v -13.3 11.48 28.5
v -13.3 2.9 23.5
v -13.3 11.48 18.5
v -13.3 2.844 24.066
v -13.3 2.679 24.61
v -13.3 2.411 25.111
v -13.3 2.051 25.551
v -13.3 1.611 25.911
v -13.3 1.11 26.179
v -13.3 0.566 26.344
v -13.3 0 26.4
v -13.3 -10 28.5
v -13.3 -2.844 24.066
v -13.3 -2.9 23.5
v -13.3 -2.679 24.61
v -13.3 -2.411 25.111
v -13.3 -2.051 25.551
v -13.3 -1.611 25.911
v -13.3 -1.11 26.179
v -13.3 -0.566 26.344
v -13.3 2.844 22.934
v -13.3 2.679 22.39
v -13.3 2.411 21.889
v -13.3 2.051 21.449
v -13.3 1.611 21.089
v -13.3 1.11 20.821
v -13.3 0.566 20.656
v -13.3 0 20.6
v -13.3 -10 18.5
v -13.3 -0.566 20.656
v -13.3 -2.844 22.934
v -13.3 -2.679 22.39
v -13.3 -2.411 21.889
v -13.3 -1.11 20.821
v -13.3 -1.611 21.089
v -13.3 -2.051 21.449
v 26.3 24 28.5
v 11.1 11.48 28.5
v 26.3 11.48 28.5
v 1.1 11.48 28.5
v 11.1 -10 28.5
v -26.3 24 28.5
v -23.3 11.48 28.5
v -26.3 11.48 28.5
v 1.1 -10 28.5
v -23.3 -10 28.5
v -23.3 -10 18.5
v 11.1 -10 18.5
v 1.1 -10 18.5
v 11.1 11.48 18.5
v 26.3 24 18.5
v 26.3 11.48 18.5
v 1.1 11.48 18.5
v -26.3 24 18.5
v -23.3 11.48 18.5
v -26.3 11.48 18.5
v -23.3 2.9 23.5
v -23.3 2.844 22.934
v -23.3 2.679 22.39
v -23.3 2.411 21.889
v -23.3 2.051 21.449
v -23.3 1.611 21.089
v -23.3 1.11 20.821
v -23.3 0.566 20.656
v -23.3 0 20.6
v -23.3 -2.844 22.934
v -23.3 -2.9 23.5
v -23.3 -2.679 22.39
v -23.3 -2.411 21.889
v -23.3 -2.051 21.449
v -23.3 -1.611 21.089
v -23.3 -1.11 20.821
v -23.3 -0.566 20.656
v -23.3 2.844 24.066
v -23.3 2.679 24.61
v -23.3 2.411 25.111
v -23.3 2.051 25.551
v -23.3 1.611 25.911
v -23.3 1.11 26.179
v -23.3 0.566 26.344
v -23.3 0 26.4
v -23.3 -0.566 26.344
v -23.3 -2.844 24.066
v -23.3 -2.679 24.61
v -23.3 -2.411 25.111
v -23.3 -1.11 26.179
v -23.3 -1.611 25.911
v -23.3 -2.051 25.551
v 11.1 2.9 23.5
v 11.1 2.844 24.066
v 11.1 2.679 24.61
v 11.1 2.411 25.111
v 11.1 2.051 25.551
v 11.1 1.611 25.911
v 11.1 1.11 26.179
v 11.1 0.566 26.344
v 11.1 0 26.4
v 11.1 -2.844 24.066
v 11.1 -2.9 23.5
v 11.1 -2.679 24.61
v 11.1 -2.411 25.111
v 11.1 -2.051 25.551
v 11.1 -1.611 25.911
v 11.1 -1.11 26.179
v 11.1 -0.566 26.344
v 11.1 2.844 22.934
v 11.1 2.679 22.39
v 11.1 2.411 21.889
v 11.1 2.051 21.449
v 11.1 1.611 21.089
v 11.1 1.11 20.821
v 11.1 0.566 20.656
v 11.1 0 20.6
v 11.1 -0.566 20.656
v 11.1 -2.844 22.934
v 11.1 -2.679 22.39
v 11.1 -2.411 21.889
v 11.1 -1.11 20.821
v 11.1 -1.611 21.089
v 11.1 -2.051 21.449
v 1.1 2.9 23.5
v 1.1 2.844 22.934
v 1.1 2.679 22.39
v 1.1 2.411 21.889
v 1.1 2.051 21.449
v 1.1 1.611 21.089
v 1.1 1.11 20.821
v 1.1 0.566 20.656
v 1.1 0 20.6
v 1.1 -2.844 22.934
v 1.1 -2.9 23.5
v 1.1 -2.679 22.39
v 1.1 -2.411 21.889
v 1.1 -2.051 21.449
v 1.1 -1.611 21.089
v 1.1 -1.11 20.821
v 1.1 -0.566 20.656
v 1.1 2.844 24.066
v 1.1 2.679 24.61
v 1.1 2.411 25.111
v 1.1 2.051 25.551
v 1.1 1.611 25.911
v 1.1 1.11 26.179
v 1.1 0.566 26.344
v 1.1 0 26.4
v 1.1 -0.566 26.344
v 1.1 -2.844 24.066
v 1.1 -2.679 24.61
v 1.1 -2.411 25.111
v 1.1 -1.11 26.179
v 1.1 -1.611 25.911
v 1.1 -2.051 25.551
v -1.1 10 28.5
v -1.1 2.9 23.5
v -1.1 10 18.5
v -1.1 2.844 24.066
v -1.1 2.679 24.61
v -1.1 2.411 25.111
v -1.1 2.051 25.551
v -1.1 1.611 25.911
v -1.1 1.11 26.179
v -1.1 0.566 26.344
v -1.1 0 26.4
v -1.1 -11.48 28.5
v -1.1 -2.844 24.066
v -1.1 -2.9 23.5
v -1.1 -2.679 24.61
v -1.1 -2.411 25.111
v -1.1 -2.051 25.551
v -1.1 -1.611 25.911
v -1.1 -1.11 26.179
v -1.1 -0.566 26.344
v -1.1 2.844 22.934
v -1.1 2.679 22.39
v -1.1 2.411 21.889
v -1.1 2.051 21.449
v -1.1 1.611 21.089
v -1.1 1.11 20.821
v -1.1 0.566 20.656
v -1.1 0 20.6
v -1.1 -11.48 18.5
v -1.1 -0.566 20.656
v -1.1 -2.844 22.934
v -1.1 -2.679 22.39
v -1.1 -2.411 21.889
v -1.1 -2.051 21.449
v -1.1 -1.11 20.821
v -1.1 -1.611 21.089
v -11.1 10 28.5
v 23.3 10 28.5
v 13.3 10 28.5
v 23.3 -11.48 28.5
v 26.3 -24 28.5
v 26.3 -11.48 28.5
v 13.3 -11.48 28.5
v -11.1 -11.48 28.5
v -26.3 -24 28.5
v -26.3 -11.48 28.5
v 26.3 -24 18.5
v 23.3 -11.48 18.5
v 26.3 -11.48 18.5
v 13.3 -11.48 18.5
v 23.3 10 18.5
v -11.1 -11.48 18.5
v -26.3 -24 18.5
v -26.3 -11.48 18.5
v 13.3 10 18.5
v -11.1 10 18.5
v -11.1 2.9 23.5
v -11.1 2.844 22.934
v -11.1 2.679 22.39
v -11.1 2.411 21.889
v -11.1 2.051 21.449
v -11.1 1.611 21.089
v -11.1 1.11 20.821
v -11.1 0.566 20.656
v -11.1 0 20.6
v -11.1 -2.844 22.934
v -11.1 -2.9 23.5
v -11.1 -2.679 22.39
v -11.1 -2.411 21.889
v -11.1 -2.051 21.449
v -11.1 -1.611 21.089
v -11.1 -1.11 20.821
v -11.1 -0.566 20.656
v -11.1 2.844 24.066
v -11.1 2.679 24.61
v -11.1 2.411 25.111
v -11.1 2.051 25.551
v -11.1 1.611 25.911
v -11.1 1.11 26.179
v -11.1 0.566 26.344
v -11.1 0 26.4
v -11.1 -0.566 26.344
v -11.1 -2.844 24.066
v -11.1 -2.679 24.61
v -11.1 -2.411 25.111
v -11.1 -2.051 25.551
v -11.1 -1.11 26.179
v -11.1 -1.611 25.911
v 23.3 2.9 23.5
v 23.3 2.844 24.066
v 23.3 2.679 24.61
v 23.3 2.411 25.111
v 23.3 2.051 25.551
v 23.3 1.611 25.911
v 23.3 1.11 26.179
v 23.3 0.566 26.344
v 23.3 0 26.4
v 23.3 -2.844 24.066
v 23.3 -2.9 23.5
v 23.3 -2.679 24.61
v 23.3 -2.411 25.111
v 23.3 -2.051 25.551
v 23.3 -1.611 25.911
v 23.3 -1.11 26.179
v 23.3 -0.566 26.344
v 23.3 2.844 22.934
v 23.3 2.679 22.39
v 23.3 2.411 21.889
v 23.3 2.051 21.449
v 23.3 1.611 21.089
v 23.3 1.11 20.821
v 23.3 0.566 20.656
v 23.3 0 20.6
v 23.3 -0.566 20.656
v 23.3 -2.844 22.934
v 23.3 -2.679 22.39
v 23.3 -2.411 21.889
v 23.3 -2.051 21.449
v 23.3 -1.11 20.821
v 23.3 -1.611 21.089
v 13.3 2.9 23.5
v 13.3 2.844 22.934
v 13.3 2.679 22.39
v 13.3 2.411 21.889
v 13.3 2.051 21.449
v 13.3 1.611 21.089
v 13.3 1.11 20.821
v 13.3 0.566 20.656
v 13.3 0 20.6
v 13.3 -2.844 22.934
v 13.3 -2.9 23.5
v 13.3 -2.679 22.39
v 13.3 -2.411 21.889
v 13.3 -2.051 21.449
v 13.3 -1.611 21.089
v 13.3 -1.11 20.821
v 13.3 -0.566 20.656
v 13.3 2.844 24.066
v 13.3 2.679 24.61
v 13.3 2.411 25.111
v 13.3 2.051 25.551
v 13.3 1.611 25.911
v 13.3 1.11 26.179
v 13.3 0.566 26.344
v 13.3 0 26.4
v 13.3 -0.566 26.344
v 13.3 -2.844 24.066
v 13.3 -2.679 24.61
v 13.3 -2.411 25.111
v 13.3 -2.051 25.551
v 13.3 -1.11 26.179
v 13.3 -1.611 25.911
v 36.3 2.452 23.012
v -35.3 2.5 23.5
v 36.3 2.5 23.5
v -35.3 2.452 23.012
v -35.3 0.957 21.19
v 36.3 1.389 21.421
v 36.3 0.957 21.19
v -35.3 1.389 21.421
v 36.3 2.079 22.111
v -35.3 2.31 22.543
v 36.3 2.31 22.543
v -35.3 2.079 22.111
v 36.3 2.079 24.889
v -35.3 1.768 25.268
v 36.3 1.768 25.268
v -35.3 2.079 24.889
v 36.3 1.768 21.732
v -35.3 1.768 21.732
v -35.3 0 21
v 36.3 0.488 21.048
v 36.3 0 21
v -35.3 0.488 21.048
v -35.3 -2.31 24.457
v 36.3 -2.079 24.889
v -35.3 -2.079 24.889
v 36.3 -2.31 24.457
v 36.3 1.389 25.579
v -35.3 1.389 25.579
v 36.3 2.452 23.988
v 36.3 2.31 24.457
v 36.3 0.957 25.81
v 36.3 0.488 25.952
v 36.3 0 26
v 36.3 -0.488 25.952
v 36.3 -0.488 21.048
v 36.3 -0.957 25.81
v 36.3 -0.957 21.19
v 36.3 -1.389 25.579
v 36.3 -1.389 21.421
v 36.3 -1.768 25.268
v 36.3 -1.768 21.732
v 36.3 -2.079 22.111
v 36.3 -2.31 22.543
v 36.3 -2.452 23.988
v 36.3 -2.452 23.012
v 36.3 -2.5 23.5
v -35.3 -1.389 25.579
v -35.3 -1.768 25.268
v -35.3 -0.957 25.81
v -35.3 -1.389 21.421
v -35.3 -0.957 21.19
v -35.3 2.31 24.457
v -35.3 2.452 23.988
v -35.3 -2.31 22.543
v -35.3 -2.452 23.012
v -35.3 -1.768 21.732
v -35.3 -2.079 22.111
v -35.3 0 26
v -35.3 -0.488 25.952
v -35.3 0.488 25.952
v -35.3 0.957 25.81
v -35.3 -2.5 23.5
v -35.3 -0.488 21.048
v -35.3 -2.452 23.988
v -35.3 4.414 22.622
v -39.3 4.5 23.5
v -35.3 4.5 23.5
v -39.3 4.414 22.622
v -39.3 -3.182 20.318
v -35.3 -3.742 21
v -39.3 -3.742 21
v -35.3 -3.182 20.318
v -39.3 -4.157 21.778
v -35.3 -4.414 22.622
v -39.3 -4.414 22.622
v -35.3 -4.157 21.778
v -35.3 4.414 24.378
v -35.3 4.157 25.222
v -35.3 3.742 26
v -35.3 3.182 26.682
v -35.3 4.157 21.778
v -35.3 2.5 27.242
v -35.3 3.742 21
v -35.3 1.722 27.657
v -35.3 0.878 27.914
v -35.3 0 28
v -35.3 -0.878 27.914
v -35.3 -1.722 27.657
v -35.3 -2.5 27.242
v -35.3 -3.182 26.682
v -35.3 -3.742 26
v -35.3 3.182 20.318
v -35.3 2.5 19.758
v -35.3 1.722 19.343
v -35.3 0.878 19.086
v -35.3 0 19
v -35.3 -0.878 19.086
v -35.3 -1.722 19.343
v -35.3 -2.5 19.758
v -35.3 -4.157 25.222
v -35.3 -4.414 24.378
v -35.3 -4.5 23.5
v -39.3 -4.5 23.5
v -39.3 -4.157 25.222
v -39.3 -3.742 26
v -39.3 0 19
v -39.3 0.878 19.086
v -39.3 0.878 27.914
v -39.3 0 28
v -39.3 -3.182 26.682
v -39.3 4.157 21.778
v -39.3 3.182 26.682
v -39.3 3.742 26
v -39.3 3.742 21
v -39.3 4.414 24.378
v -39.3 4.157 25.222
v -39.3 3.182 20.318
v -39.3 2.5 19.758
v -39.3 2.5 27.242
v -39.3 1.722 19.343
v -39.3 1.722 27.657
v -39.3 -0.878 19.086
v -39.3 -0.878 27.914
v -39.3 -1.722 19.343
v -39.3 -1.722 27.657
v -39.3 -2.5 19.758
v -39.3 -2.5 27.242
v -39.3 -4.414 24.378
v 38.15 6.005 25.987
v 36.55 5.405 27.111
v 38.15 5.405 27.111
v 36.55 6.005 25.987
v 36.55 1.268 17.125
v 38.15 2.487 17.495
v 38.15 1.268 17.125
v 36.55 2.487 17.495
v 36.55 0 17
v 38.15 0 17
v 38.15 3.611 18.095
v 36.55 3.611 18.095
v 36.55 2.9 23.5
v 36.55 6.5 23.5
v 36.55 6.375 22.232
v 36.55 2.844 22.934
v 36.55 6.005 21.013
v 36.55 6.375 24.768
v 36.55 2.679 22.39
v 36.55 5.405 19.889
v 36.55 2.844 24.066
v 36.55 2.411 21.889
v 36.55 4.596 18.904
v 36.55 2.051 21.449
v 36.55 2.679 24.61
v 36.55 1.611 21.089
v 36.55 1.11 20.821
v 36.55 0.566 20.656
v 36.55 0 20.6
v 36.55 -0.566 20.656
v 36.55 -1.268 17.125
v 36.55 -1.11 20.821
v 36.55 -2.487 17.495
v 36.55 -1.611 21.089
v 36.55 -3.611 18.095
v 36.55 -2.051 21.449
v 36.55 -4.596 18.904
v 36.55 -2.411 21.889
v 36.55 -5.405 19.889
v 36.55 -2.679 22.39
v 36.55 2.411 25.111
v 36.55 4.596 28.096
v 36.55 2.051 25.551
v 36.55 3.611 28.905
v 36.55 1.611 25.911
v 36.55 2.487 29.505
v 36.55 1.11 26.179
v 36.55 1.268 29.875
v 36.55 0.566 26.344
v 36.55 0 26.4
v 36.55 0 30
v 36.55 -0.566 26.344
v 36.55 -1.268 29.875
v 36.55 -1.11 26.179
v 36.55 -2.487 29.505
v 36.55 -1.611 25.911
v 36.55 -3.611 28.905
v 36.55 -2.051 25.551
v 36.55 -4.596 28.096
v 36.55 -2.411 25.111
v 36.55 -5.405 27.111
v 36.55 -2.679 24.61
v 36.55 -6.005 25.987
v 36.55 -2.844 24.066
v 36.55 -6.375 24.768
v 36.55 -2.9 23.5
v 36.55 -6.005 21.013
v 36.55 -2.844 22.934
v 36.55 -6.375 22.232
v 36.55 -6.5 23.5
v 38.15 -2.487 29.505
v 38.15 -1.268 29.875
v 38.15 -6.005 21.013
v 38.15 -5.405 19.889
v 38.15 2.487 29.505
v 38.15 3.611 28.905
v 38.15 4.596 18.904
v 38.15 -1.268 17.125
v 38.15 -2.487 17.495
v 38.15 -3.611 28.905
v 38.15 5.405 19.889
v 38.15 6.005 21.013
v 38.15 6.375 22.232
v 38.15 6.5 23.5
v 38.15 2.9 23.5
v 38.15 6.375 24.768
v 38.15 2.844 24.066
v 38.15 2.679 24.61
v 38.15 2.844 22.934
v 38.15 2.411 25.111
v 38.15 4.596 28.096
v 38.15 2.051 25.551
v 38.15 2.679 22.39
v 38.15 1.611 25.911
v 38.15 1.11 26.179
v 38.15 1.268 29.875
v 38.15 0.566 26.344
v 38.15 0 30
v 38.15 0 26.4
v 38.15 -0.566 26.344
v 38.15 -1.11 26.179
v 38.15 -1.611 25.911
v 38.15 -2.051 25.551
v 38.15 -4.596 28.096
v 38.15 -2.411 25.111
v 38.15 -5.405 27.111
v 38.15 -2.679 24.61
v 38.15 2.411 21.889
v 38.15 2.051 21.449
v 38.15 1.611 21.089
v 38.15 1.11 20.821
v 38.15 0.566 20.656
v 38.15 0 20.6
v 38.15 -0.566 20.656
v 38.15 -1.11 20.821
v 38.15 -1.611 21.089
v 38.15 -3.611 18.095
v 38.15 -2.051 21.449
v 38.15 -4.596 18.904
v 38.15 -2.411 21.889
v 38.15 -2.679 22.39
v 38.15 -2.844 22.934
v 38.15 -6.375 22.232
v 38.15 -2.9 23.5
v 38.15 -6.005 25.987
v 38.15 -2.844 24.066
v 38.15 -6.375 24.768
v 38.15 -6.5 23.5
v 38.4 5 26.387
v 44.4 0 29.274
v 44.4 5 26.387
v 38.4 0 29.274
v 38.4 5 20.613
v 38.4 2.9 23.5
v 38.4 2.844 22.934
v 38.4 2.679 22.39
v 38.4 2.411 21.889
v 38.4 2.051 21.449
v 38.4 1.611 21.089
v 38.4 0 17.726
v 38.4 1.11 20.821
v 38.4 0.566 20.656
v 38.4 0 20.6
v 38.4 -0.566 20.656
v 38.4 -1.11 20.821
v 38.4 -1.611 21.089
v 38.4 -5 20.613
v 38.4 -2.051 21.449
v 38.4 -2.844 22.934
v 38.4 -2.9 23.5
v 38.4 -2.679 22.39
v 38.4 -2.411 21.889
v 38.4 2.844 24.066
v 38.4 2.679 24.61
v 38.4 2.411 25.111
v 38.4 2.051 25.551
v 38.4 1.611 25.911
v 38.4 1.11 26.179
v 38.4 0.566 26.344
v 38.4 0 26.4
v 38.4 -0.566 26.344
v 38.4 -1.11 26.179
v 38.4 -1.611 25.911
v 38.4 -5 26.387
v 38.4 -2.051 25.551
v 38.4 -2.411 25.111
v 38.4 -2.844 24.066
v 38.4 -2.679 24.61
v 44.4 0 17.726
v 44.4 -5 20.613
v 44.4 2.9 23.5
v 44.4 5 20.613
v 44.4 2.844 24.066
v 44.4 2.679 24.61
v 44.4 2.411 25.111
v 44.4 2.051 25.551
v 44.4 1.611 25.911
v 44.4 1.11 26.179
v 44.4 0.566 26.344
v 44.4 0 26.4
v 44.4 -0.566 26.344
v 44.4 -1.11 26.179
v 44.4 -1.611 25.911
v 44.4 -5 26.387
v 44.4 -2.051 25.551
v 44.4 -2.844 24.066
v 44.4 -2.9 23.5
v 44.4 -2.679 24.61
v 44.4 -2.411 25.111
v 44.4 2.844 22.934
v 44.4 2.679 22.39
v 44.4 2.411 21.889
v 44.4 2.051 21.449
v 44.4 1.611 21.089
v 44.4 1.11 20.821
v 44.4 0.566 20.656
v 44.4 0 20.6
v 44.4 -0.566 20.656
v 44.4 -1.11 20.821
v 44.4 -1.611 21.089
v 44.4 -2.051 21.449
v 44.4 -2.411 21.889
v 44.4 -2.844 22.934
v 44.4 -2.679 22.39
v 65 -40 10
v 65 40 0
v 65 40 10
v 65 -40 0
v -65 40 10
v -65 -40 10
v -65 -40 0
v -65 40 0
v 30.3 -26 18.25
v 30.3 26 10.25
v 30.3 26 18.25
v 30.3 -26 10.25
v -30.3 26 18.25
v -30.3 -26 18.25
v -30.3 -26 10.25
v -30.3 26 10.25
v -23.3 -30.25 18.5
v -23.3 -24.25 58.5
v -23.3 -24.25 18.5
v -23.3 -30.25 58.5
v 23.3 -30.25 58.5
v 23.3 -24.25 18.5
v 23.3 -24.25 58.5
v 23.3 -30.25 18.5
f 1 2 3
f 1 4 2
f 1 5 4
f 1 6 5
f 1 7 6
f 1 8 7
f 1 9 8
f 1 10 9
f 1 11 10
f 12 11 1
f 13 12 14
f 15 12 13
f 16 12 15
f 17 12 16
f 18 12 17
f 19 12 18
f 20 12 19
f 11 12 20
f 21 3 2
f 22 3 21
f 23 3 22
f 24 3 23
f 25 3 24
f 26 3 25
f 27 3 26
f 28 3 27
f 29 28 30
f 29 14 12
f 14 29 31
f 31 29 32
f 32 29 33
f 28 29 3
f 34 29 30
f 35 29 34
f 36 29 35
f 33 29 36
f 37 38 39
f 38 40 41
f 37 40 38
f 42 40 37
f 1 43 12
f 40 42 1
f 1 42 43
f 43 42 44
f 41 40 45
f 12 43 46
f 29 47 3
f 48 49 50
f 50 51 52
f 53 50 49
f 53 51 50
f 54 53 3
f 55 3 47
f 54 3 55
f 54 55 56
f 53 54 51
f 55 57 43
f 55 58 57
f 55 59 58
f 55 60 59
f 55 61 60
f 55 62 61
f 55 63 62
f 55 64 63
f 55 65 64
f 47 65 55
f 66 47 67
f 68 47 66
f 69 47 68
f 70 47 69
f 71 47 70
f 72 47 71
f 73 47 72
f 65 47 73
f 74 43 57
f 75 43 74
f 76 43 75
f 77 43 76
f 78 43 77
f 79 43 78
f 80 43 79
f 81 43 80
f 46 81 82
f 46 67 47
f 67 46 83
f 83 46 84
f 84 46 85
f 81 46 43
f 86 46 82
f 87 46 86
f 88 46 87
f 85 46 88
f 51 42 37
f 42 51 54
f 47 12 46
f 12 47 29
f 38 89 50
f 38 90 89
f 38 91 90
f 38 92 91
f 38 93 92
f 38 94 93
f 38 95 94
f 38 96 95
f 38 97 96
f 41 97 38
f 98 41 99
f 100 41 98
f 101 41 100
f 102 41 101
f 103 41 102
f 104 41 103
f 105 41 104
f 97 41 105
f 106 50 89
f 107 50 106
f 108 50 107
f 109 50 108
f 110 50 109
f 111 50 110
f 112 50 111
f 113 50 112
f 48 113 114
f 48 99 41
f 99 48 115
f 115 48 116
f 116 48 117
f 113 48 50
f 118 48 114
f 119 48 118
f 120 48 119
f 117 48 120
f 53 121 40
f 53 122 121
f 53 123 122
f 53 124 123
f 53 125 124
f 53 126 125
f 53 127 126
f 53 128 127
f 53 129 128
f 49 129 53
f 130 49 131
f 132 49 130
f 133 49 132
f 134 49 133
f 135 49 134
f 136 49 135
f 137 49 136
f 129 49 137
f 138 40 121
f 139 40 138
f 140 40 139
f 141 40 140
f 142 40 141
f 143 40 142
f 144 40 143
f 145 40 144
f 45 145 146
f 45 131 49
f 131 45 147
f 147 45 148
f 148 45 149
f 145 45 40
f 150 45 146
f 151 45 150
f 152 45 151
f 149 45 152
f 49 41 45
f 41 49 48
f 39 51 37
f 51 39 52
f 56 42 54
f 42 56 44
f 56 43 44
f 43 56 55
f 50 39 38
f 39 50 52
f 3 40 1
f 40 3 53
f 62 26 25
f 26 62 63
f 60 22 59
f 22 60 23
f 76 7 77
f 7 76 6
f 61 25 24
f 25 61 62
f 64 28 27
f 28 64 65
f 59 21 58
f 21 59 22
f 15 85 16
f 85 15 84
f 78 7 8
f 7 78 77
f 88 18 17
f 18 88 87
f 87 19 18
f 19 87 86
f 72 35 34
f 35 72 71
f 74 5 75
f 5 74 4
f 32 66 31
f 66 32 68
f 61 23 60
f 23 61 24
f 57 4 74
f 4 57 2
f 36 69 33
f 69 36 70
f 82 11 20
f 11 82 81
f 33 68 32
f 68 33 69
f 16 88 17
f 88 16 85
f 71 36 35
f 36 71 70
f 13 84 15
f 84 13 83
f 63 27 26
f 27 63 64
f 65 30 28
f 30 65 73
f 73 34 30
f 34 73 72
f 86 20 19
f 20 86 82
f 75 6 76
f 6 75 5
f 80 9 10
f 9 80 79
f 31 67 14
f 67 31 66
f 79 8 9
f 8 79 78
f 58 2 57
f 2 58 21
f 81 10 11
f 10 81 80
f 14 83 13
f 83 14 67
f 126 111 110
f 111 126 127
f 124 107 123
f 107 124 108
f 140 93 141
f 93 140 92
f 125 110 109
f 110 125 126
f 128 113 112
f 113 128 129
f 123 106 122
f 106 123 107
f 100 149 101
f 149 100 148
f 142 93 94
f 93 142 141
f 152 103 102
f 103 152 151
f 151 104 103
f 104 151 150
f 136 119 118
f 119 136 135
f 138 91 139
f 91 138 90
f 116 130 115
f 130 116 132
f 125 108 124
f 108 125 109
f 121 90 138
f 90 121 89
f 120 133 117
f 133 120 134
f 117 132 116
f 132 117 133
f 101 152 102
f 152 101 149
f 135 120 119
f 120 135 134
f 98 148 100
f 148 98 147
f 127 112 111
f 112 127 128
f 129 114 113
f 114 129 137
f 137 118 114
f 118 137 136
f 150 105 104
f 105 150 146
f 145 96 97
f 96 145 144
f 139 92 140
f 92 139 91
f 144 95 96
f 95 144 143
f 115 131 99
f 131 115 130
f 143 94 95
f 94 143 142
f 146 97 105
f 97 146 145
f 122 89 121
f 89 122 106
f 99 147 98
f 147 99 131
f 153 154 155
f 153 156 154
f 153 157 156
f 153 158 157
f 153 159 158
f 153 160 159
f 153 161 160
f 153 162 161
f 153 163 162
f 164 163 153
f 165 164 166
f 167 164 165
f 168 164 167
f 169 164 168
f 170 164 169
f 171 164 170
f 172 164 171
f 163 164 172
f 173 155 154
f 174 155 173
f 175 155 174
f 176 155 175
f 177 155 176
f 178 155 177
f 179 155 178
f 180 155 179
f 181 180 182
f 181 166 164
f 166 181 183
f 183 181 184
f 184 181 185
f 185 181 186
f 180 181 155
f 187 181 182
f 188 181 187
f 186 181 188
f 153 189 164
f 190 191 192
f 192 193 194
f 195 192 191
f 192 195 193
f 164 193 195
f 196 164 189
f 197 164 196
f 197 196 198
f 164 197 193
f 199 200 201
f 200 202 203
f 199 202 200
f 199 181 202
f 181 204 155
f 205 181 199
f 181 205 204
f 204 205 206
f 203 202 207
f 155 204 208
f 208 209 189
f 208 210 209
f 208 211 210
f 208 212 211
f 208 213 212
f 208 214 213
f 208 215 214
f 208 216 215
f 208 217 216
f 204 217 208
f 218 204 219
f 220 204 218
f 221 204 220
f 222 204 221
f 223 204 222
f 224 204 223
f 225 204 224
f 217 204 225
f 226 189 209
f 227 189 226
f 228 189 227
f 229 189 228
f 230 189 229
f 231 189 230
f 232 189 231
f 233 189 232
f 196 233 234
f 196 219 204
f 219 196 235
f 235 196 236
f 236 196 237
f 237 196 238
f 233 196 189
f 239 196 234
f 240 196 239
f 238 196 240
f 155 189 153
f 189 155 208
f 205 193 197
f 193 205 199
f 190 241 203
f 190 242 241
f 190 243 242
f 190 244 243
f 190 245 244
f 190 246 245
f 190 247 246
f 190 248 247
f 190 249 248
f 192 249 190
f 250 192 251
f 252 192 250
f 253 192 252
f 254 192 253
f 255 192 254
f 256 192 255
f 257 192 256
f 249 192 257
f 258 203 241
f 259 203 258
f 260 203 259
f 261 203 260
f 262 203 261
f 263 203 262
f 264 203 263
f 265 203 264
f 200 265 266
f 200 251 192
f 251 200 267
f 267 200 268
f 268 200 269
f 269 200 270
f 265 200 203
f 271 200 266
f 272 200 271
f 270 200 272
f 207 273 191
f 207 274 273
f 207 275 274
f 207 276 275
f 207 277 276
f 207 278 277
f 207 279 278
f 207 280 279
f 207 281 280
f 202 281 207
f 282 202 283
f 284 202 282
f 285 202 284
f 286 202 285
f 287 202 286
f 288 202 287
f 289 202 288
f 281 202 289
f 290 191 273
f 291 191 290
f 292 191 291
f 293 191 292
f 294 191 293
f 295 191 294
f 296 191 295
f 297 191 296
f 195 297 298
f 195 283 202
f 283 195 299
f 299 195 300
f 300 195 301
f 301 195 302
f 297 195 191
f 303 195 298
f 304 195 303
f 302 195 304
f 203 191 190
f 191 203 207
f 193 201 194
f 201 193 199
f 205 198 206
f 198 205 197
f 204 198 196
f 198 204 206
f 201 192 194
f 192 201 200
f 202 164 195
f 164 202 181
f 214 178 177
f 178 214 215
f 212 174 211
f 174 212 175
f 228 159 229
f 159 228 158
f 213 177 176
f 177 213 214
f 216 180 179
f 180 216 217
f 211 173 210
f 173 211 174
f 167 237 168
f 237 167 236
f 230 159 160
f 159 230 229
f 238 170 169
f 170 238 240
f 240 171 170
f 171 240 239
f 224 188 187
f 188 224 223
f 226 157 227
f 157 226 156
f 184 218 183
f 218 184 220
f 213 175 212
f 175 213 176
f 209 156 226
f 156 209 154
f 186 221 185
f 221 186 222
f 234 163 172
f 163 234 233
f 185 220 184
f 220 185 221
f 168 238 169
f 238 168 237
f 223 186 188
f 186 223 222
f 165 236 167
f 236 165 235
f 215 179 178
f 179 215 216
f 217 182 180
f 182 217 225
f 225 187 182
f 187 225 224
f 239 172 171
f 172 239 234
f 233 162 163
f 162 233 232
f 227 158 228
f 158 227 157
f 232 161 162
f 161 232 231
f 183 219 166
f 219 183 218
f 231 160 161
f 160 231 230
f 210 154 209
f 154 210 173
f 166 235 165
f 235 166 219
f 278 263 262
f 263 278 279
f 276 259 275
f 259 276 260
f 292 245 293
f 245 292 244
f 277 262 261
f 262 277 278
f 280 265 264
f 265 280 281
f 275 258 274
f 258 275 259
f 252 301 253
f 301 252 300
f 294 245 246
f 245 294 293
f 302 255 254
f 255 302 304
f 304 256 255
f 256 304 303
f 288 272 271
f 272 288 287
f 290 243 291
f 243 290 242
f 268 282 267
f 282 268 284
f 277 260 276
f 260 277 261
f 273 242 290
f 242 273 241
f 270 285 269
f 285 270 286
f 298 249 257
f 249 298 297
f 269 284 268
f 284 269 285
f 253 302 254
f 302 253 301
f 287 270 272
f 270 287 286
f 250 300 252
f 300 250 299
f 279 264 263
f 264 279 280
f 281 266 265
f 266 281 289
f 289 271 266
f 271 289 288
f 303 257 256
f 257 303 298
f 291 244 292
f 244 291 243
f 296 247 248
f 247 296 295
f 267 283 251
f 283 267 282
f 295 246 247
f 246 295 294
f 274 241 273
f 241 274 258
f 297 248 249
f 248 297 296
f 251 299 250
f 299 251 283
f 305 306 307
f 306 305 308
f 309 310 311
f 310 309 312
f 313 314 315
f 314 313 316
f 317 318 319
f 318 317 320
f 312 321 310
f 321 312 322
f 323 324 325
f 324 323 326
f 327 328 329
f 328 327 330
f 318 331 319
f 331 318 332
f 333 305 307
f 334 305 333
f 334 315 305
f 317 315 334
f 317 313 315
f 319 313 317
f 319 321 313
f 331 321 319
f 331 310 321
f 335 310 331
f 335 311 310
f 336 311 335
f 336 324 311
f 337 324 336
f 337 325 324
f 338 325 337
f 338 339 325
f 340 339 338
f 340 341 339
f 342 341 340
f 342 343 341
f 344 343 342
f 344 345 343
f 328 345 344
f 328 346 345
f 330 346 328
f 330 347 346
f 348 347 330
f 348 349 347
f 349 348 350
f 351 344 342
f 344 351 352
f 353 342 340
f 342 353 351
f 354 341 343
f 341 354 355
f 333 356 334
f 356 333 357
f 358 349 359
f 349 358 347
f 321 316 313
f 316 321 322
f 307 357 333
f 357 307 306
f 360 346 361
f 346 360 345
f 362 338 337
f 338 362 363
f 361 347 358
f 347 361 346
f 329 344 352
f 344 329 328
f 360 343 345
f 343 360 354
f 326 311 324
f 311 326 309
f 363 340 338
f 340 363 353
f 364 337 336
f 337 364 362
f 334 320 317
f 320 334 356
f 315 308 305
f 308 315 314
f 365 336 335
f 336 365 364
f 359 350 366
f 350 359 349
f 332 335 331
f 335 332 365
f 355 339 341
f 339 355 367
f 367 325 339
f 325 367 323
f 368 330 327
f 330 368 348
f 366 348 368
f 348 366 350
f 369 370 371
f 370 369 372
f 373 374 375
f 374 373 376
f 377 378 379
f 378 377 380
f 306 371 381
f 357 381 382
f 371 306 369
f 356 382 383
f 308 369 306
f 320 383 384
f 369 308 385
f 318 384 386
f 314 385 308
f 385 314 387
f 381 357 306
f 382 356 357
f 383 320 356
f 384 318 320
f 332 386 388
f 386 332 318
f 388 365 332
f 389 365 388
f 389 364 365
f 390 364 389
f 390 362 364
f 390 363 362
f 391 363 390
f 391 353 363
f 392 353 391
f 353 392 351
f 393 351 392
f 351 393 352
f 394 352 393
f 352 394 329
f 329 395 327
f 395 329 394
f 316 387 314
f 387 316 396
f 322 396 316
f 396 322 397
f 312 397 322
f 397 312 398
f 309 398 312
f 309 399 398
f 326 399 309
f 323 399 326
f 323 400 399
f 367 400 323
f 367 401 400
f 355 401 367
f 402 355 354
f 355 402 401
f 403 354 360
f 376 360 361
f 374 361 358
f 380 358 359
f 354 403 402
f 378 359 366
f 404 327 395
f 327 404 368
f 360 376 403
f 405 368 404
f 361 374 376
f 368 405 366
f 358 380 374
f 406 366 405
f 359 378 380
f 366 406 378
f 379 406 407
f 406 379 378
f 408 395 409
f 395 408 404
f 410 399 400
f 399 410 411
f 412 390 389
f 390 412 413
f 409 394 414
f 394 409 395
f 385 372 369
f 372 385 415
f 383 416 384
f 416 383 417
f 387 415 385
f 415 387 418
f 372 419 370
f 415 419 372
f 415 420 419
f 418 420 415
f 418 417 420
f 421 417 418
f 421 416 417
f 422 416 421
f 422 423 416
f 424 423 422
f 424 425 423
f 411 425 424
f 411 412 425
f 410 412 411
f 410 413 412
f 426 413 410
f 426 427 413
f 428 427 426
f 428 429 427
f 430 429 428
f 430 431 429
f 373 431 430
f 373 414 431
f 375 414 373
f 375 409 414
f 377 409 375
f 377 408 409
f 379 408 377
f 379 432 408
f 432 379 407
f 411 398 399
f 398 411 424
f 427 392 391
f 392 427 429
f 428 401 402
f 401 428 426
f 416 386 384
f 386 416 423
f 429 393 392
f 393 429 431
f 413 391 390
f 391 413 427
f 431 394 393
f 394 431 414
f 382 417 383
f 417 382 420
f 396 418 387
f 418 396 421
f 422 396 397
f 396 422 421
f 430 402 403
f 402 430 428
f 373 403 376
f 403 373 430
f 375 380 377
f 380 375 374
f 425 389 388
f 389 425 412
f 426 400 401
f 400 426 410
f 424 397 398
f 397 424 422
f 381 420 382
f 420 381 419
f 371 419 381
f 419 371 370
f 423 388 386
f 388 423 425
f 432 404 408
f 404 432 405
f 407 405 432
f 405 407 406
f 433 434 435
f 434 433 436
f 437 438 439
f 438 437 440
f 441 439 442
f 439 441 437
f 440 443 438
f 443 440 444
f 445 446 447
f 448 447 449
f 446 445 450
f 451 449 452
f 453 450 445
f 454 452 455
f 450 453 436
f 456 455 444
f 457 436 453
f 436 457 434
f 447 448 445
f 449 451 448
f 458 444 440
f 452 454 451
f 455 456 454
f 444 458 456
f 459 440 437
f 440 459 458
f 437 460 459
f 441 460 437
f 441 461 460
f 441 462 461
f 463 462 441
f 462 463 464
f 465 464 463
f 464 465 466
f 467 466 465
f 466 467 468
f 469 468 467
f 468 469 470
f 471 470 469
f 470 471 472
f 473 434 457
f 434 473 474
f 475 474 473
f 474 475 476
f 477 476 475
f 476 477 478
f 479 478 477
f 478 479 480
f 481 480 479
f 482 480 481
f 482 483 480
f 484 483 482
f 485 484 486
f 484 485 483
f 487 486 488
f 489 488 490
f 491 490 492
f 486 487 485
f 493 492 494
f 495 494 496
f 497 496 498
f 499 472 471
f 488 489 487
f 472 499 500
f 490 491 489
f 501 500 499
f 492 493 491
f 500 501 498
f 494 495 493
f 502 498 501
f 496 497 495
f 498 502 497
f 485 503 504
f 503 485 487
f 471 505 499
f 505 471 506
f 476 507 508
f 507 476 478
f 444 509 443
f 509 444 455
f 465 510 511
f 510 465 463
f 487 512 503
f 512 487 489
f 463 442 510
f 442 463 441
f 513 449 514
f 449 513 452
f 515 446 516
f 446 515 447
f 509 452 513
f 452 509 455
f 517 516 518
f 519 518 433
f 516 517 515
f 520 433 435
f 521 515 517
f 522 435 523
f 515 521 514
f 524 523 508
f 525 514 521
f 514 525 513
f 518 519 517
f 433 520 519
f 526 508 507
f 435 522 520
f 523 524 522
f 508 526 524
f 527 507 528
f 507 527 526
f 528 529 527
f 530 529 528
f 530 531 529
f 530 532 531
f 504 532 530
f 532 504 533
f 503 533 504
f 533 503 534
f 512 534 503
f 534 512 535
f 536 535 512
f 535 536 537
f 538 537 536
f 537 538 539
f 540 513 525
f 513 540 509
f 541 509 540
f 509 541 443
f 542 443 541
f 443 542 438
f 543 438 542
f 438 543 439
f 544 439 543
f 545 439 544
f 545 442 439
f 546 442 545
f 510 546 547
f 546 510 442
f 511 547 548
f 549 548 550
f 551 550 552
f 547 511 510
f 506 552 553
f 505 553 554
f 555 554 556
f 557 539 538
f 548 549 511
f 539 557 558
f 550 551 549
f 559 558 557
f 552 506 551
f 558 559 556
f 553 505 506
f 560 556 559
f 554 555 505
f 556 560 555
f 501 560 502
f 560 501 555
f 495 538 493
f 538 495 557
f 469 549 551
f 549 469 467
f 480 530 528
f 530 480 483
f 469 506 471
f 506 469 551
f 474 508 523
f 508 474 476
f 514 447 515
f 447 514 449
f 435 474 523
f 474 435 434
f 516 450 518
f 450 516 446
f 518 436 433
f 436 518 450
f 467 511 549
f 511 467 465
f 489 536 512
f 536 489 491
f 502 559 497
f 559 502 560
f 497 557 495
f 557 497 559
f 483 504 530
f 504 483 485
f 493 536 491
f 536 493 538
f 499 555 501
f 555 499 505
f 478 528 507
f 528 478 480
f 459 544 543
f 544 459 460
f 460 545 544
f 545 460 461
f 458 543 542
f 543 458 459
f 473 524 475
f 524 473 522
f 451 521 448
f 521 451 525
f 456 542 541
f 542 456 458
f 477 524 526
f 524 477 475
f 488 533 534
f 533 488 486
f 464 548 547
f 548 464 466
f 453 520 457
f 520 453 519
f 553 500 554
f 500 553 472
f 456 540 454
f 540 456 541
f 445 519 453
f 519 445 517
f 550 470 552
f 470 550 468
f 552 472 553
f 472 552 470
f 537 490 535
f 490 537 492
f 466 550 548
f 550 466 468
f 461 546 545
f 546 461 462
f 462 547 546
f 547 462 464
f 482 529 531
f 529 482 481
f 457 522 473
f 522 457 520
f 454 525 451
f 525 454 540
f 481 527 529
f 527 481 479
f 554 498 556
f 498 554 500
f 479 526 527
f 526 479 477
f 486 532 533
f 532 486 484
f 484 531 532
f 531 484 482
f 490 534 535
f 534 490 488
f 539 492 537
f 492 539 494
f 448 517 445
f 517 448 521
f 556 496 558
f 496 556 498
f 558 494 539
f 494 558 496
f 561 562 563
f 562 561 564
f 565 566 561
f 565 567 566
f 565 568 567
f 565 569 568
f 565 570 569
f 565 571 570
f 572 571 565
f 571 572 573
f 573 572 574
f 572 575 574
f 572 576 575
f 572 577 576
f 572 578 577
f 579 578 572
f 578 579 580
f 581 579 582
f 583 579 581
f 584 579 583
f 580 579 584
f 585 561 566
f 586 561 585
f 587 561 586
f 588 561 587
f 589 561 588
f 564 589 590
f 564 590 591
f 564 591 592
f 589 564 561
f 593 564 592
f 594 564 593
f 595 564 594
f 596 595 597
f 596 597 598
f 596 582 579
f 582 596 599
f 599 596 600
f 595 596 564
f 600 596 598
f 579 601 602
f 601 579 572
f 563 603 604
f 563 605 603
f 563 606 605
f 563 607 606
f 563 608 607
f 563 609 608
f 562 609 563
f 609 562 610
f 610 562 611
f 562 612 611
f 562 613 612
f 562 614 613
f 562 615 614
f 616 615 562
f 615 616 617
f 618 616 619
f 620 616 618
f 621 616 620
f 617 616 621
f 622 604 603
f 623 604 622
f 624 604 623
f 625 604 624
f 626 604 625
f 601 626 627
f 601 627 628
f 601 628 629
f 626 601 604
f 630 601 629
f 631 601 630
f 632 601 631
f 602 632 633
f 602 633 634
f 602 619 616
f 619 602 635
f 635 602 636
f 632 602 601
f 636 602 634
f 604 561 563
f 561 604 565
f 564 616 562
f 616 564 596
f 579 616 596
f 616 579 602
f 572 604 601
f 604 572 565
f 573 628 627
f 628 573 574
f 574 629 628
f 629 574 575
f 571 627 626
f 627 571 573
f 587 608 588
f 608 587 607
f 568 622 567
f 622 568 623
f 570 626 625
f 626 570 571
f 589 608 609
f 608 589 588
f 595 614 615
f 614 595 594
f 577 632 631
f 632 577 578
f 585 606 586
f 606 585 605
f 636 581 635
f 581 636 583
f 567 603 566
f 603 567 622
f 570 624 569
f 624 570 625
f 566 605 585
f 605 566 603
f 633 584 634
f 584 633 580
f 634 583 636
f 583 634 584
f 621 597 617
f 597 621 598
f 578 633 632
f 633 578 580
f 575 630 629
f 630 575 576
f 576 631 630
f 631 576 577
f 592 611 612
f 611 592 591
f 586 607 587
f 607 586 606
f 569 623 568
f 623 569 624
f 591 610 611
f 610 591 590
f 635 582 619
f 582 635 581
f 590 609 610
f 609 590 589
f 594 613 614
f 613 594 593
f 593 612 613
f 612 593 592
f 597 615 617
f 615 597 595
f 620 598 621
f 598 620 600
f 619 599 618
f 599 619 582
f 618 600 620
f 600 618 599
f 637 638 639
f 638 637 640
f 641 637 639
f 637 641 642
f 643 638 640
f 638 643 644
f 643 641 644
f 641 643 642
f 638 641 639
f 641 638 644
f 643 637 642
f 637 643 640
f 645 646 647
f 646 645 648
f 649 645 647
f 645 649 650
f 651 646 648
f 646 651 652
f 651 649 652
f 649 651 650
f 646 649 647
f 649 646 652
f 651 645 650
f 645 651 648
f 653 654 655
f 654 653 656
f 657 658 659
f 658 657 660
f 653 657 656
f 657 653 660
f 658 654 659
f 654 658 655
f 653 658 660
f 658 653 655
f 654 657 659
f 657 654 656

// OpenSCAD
$fn = 32;

// ------------------------------------------------------------------------
// Comb hinge with flap: leaf 52.6 x 24 mm, pin d5, flap 40 mm
// Every part is its own module, assembly() places every instance.
// ------------------------------------------------------------------------

// --- part 1 ---
module hinge_bed() {
  difference() {
    translate([-65, -40, 0]) cube([130, 80, 10]);
  }
}

// --- part 2 ---
module hinge_riser() {
  difference() {
    translate([-30.3, -26, 0]) cube([60.6, 52, 8]);
  }
}

// --- part 3 ---
module hinge_leaf_a() {
  difference() {
    union() {
      translate([-23.3, -10, -5]) cube([10, 34, 10]);
      translate([1.1, -10, -5]) cube([10, 34, 10]);
      translate([-26.3, 11.48, -5]) cube([52.6, 12.52, 10]);
    }
    translate([-18.3, 0, 0]) rotate([0, 90, 0]) cylinder(h = 12, d = 5.8, center = true);
    translate([6.1, 0, 0]) rotate([0, 90, 0]) cylinder(h = 12, d = 5.8, center = true);
  }
}

// --- part 4 ---
module hinge_leaf_b() {
  difference() {
    union() {
      translate([-11.1, -24, -5]) cube([10, 34, 10]);
      translate([13.3, -24, -5]) cube([10, 34, 10]);
      translate([-26.3, -24, -5]) cube([52.6, 12.52, 10]);
    }
    translate([-6.1, 0, 0]) rotate([0, 90, 0]) cylinder(h = 12, d = 5.8, center = true);
    translate([18.3, 0, 0]) rotate([0, 90, 0]) cylinder(h = 12, d = 5.8, center = true);
  }
}

// --- part 5 ---
module hinge_flap() {
  difference() {
    translate([-23.3, -20, 0]) cube([46.6, 40, 6]);
  }
}

// --- part 6 ---
module hinge_pin() {
  rotate([0, 90, 0]) cylinder(h = 72.6, d = 5, center = true);
  translate([-39.3, 0, 0]) rotate([0, 90, 0]) cylinder(h = 4, d = 9);
}

// --- part 7 ---
module pin_washer() {
  difference() {
      translate([0, 0, 0]) cylinder(h = 1.6, d = 13);
      translate([0, 0, -1]) cylinder(h = 3.6, d = 5.8);
    }
}

// --- part 8 ---
module pin_nut() {
  difference() {
    linear_extrude(height = 6) polygon(points = [[5.774, 0], [2.887, 5], [-2.887, 5], [-5.774, 0], [-2.887, -5], [2.887, -5]]);
    translate([0, 0, -1]) cylinder(h = 8, d = 5.8);
  }
}

// --- assembly ---
module assembly() {
  color([0.80, 0.24, 0.20]) translate([0, 0, 0]) rotate([0, 0, 0]) hinge_bed();
  color([0.20, 0.45, 0.75]) translate([0, 0, 10.25]) rotate([0, 0, 0]) hinge_riser();
  color([0.25, 0.62, 0.32]) translate([0, 0, 23.5]) rotate([0, 0, 0]) hinge_leaf_a();
  color([0.92, 0.70, 0.18]) translate([0, 0, 23.5]) rotate([0, 0, 0]) hinge_leaf_b();
  color([0.58, 0.35, 0.70]) translate([0, -24.25, 38.5]) rotate([90, 0, 0]) hinge_flap();
  color([0.16, 0.66, 0.66]) translate([0, 0, 23.5]) rotate([0, 0, 0]) hinge_pin();
  color([0.85, 0.48, 0.18]) translate([36.55, 0, 23.5]) rotate([0, 90, 0]) pin_washer();
  color([0.55, 0.60, 0.65]) translate([38.4, 0, 23.5]) rotate([0, 90, 0]) pin_nut();
}

assembly();
